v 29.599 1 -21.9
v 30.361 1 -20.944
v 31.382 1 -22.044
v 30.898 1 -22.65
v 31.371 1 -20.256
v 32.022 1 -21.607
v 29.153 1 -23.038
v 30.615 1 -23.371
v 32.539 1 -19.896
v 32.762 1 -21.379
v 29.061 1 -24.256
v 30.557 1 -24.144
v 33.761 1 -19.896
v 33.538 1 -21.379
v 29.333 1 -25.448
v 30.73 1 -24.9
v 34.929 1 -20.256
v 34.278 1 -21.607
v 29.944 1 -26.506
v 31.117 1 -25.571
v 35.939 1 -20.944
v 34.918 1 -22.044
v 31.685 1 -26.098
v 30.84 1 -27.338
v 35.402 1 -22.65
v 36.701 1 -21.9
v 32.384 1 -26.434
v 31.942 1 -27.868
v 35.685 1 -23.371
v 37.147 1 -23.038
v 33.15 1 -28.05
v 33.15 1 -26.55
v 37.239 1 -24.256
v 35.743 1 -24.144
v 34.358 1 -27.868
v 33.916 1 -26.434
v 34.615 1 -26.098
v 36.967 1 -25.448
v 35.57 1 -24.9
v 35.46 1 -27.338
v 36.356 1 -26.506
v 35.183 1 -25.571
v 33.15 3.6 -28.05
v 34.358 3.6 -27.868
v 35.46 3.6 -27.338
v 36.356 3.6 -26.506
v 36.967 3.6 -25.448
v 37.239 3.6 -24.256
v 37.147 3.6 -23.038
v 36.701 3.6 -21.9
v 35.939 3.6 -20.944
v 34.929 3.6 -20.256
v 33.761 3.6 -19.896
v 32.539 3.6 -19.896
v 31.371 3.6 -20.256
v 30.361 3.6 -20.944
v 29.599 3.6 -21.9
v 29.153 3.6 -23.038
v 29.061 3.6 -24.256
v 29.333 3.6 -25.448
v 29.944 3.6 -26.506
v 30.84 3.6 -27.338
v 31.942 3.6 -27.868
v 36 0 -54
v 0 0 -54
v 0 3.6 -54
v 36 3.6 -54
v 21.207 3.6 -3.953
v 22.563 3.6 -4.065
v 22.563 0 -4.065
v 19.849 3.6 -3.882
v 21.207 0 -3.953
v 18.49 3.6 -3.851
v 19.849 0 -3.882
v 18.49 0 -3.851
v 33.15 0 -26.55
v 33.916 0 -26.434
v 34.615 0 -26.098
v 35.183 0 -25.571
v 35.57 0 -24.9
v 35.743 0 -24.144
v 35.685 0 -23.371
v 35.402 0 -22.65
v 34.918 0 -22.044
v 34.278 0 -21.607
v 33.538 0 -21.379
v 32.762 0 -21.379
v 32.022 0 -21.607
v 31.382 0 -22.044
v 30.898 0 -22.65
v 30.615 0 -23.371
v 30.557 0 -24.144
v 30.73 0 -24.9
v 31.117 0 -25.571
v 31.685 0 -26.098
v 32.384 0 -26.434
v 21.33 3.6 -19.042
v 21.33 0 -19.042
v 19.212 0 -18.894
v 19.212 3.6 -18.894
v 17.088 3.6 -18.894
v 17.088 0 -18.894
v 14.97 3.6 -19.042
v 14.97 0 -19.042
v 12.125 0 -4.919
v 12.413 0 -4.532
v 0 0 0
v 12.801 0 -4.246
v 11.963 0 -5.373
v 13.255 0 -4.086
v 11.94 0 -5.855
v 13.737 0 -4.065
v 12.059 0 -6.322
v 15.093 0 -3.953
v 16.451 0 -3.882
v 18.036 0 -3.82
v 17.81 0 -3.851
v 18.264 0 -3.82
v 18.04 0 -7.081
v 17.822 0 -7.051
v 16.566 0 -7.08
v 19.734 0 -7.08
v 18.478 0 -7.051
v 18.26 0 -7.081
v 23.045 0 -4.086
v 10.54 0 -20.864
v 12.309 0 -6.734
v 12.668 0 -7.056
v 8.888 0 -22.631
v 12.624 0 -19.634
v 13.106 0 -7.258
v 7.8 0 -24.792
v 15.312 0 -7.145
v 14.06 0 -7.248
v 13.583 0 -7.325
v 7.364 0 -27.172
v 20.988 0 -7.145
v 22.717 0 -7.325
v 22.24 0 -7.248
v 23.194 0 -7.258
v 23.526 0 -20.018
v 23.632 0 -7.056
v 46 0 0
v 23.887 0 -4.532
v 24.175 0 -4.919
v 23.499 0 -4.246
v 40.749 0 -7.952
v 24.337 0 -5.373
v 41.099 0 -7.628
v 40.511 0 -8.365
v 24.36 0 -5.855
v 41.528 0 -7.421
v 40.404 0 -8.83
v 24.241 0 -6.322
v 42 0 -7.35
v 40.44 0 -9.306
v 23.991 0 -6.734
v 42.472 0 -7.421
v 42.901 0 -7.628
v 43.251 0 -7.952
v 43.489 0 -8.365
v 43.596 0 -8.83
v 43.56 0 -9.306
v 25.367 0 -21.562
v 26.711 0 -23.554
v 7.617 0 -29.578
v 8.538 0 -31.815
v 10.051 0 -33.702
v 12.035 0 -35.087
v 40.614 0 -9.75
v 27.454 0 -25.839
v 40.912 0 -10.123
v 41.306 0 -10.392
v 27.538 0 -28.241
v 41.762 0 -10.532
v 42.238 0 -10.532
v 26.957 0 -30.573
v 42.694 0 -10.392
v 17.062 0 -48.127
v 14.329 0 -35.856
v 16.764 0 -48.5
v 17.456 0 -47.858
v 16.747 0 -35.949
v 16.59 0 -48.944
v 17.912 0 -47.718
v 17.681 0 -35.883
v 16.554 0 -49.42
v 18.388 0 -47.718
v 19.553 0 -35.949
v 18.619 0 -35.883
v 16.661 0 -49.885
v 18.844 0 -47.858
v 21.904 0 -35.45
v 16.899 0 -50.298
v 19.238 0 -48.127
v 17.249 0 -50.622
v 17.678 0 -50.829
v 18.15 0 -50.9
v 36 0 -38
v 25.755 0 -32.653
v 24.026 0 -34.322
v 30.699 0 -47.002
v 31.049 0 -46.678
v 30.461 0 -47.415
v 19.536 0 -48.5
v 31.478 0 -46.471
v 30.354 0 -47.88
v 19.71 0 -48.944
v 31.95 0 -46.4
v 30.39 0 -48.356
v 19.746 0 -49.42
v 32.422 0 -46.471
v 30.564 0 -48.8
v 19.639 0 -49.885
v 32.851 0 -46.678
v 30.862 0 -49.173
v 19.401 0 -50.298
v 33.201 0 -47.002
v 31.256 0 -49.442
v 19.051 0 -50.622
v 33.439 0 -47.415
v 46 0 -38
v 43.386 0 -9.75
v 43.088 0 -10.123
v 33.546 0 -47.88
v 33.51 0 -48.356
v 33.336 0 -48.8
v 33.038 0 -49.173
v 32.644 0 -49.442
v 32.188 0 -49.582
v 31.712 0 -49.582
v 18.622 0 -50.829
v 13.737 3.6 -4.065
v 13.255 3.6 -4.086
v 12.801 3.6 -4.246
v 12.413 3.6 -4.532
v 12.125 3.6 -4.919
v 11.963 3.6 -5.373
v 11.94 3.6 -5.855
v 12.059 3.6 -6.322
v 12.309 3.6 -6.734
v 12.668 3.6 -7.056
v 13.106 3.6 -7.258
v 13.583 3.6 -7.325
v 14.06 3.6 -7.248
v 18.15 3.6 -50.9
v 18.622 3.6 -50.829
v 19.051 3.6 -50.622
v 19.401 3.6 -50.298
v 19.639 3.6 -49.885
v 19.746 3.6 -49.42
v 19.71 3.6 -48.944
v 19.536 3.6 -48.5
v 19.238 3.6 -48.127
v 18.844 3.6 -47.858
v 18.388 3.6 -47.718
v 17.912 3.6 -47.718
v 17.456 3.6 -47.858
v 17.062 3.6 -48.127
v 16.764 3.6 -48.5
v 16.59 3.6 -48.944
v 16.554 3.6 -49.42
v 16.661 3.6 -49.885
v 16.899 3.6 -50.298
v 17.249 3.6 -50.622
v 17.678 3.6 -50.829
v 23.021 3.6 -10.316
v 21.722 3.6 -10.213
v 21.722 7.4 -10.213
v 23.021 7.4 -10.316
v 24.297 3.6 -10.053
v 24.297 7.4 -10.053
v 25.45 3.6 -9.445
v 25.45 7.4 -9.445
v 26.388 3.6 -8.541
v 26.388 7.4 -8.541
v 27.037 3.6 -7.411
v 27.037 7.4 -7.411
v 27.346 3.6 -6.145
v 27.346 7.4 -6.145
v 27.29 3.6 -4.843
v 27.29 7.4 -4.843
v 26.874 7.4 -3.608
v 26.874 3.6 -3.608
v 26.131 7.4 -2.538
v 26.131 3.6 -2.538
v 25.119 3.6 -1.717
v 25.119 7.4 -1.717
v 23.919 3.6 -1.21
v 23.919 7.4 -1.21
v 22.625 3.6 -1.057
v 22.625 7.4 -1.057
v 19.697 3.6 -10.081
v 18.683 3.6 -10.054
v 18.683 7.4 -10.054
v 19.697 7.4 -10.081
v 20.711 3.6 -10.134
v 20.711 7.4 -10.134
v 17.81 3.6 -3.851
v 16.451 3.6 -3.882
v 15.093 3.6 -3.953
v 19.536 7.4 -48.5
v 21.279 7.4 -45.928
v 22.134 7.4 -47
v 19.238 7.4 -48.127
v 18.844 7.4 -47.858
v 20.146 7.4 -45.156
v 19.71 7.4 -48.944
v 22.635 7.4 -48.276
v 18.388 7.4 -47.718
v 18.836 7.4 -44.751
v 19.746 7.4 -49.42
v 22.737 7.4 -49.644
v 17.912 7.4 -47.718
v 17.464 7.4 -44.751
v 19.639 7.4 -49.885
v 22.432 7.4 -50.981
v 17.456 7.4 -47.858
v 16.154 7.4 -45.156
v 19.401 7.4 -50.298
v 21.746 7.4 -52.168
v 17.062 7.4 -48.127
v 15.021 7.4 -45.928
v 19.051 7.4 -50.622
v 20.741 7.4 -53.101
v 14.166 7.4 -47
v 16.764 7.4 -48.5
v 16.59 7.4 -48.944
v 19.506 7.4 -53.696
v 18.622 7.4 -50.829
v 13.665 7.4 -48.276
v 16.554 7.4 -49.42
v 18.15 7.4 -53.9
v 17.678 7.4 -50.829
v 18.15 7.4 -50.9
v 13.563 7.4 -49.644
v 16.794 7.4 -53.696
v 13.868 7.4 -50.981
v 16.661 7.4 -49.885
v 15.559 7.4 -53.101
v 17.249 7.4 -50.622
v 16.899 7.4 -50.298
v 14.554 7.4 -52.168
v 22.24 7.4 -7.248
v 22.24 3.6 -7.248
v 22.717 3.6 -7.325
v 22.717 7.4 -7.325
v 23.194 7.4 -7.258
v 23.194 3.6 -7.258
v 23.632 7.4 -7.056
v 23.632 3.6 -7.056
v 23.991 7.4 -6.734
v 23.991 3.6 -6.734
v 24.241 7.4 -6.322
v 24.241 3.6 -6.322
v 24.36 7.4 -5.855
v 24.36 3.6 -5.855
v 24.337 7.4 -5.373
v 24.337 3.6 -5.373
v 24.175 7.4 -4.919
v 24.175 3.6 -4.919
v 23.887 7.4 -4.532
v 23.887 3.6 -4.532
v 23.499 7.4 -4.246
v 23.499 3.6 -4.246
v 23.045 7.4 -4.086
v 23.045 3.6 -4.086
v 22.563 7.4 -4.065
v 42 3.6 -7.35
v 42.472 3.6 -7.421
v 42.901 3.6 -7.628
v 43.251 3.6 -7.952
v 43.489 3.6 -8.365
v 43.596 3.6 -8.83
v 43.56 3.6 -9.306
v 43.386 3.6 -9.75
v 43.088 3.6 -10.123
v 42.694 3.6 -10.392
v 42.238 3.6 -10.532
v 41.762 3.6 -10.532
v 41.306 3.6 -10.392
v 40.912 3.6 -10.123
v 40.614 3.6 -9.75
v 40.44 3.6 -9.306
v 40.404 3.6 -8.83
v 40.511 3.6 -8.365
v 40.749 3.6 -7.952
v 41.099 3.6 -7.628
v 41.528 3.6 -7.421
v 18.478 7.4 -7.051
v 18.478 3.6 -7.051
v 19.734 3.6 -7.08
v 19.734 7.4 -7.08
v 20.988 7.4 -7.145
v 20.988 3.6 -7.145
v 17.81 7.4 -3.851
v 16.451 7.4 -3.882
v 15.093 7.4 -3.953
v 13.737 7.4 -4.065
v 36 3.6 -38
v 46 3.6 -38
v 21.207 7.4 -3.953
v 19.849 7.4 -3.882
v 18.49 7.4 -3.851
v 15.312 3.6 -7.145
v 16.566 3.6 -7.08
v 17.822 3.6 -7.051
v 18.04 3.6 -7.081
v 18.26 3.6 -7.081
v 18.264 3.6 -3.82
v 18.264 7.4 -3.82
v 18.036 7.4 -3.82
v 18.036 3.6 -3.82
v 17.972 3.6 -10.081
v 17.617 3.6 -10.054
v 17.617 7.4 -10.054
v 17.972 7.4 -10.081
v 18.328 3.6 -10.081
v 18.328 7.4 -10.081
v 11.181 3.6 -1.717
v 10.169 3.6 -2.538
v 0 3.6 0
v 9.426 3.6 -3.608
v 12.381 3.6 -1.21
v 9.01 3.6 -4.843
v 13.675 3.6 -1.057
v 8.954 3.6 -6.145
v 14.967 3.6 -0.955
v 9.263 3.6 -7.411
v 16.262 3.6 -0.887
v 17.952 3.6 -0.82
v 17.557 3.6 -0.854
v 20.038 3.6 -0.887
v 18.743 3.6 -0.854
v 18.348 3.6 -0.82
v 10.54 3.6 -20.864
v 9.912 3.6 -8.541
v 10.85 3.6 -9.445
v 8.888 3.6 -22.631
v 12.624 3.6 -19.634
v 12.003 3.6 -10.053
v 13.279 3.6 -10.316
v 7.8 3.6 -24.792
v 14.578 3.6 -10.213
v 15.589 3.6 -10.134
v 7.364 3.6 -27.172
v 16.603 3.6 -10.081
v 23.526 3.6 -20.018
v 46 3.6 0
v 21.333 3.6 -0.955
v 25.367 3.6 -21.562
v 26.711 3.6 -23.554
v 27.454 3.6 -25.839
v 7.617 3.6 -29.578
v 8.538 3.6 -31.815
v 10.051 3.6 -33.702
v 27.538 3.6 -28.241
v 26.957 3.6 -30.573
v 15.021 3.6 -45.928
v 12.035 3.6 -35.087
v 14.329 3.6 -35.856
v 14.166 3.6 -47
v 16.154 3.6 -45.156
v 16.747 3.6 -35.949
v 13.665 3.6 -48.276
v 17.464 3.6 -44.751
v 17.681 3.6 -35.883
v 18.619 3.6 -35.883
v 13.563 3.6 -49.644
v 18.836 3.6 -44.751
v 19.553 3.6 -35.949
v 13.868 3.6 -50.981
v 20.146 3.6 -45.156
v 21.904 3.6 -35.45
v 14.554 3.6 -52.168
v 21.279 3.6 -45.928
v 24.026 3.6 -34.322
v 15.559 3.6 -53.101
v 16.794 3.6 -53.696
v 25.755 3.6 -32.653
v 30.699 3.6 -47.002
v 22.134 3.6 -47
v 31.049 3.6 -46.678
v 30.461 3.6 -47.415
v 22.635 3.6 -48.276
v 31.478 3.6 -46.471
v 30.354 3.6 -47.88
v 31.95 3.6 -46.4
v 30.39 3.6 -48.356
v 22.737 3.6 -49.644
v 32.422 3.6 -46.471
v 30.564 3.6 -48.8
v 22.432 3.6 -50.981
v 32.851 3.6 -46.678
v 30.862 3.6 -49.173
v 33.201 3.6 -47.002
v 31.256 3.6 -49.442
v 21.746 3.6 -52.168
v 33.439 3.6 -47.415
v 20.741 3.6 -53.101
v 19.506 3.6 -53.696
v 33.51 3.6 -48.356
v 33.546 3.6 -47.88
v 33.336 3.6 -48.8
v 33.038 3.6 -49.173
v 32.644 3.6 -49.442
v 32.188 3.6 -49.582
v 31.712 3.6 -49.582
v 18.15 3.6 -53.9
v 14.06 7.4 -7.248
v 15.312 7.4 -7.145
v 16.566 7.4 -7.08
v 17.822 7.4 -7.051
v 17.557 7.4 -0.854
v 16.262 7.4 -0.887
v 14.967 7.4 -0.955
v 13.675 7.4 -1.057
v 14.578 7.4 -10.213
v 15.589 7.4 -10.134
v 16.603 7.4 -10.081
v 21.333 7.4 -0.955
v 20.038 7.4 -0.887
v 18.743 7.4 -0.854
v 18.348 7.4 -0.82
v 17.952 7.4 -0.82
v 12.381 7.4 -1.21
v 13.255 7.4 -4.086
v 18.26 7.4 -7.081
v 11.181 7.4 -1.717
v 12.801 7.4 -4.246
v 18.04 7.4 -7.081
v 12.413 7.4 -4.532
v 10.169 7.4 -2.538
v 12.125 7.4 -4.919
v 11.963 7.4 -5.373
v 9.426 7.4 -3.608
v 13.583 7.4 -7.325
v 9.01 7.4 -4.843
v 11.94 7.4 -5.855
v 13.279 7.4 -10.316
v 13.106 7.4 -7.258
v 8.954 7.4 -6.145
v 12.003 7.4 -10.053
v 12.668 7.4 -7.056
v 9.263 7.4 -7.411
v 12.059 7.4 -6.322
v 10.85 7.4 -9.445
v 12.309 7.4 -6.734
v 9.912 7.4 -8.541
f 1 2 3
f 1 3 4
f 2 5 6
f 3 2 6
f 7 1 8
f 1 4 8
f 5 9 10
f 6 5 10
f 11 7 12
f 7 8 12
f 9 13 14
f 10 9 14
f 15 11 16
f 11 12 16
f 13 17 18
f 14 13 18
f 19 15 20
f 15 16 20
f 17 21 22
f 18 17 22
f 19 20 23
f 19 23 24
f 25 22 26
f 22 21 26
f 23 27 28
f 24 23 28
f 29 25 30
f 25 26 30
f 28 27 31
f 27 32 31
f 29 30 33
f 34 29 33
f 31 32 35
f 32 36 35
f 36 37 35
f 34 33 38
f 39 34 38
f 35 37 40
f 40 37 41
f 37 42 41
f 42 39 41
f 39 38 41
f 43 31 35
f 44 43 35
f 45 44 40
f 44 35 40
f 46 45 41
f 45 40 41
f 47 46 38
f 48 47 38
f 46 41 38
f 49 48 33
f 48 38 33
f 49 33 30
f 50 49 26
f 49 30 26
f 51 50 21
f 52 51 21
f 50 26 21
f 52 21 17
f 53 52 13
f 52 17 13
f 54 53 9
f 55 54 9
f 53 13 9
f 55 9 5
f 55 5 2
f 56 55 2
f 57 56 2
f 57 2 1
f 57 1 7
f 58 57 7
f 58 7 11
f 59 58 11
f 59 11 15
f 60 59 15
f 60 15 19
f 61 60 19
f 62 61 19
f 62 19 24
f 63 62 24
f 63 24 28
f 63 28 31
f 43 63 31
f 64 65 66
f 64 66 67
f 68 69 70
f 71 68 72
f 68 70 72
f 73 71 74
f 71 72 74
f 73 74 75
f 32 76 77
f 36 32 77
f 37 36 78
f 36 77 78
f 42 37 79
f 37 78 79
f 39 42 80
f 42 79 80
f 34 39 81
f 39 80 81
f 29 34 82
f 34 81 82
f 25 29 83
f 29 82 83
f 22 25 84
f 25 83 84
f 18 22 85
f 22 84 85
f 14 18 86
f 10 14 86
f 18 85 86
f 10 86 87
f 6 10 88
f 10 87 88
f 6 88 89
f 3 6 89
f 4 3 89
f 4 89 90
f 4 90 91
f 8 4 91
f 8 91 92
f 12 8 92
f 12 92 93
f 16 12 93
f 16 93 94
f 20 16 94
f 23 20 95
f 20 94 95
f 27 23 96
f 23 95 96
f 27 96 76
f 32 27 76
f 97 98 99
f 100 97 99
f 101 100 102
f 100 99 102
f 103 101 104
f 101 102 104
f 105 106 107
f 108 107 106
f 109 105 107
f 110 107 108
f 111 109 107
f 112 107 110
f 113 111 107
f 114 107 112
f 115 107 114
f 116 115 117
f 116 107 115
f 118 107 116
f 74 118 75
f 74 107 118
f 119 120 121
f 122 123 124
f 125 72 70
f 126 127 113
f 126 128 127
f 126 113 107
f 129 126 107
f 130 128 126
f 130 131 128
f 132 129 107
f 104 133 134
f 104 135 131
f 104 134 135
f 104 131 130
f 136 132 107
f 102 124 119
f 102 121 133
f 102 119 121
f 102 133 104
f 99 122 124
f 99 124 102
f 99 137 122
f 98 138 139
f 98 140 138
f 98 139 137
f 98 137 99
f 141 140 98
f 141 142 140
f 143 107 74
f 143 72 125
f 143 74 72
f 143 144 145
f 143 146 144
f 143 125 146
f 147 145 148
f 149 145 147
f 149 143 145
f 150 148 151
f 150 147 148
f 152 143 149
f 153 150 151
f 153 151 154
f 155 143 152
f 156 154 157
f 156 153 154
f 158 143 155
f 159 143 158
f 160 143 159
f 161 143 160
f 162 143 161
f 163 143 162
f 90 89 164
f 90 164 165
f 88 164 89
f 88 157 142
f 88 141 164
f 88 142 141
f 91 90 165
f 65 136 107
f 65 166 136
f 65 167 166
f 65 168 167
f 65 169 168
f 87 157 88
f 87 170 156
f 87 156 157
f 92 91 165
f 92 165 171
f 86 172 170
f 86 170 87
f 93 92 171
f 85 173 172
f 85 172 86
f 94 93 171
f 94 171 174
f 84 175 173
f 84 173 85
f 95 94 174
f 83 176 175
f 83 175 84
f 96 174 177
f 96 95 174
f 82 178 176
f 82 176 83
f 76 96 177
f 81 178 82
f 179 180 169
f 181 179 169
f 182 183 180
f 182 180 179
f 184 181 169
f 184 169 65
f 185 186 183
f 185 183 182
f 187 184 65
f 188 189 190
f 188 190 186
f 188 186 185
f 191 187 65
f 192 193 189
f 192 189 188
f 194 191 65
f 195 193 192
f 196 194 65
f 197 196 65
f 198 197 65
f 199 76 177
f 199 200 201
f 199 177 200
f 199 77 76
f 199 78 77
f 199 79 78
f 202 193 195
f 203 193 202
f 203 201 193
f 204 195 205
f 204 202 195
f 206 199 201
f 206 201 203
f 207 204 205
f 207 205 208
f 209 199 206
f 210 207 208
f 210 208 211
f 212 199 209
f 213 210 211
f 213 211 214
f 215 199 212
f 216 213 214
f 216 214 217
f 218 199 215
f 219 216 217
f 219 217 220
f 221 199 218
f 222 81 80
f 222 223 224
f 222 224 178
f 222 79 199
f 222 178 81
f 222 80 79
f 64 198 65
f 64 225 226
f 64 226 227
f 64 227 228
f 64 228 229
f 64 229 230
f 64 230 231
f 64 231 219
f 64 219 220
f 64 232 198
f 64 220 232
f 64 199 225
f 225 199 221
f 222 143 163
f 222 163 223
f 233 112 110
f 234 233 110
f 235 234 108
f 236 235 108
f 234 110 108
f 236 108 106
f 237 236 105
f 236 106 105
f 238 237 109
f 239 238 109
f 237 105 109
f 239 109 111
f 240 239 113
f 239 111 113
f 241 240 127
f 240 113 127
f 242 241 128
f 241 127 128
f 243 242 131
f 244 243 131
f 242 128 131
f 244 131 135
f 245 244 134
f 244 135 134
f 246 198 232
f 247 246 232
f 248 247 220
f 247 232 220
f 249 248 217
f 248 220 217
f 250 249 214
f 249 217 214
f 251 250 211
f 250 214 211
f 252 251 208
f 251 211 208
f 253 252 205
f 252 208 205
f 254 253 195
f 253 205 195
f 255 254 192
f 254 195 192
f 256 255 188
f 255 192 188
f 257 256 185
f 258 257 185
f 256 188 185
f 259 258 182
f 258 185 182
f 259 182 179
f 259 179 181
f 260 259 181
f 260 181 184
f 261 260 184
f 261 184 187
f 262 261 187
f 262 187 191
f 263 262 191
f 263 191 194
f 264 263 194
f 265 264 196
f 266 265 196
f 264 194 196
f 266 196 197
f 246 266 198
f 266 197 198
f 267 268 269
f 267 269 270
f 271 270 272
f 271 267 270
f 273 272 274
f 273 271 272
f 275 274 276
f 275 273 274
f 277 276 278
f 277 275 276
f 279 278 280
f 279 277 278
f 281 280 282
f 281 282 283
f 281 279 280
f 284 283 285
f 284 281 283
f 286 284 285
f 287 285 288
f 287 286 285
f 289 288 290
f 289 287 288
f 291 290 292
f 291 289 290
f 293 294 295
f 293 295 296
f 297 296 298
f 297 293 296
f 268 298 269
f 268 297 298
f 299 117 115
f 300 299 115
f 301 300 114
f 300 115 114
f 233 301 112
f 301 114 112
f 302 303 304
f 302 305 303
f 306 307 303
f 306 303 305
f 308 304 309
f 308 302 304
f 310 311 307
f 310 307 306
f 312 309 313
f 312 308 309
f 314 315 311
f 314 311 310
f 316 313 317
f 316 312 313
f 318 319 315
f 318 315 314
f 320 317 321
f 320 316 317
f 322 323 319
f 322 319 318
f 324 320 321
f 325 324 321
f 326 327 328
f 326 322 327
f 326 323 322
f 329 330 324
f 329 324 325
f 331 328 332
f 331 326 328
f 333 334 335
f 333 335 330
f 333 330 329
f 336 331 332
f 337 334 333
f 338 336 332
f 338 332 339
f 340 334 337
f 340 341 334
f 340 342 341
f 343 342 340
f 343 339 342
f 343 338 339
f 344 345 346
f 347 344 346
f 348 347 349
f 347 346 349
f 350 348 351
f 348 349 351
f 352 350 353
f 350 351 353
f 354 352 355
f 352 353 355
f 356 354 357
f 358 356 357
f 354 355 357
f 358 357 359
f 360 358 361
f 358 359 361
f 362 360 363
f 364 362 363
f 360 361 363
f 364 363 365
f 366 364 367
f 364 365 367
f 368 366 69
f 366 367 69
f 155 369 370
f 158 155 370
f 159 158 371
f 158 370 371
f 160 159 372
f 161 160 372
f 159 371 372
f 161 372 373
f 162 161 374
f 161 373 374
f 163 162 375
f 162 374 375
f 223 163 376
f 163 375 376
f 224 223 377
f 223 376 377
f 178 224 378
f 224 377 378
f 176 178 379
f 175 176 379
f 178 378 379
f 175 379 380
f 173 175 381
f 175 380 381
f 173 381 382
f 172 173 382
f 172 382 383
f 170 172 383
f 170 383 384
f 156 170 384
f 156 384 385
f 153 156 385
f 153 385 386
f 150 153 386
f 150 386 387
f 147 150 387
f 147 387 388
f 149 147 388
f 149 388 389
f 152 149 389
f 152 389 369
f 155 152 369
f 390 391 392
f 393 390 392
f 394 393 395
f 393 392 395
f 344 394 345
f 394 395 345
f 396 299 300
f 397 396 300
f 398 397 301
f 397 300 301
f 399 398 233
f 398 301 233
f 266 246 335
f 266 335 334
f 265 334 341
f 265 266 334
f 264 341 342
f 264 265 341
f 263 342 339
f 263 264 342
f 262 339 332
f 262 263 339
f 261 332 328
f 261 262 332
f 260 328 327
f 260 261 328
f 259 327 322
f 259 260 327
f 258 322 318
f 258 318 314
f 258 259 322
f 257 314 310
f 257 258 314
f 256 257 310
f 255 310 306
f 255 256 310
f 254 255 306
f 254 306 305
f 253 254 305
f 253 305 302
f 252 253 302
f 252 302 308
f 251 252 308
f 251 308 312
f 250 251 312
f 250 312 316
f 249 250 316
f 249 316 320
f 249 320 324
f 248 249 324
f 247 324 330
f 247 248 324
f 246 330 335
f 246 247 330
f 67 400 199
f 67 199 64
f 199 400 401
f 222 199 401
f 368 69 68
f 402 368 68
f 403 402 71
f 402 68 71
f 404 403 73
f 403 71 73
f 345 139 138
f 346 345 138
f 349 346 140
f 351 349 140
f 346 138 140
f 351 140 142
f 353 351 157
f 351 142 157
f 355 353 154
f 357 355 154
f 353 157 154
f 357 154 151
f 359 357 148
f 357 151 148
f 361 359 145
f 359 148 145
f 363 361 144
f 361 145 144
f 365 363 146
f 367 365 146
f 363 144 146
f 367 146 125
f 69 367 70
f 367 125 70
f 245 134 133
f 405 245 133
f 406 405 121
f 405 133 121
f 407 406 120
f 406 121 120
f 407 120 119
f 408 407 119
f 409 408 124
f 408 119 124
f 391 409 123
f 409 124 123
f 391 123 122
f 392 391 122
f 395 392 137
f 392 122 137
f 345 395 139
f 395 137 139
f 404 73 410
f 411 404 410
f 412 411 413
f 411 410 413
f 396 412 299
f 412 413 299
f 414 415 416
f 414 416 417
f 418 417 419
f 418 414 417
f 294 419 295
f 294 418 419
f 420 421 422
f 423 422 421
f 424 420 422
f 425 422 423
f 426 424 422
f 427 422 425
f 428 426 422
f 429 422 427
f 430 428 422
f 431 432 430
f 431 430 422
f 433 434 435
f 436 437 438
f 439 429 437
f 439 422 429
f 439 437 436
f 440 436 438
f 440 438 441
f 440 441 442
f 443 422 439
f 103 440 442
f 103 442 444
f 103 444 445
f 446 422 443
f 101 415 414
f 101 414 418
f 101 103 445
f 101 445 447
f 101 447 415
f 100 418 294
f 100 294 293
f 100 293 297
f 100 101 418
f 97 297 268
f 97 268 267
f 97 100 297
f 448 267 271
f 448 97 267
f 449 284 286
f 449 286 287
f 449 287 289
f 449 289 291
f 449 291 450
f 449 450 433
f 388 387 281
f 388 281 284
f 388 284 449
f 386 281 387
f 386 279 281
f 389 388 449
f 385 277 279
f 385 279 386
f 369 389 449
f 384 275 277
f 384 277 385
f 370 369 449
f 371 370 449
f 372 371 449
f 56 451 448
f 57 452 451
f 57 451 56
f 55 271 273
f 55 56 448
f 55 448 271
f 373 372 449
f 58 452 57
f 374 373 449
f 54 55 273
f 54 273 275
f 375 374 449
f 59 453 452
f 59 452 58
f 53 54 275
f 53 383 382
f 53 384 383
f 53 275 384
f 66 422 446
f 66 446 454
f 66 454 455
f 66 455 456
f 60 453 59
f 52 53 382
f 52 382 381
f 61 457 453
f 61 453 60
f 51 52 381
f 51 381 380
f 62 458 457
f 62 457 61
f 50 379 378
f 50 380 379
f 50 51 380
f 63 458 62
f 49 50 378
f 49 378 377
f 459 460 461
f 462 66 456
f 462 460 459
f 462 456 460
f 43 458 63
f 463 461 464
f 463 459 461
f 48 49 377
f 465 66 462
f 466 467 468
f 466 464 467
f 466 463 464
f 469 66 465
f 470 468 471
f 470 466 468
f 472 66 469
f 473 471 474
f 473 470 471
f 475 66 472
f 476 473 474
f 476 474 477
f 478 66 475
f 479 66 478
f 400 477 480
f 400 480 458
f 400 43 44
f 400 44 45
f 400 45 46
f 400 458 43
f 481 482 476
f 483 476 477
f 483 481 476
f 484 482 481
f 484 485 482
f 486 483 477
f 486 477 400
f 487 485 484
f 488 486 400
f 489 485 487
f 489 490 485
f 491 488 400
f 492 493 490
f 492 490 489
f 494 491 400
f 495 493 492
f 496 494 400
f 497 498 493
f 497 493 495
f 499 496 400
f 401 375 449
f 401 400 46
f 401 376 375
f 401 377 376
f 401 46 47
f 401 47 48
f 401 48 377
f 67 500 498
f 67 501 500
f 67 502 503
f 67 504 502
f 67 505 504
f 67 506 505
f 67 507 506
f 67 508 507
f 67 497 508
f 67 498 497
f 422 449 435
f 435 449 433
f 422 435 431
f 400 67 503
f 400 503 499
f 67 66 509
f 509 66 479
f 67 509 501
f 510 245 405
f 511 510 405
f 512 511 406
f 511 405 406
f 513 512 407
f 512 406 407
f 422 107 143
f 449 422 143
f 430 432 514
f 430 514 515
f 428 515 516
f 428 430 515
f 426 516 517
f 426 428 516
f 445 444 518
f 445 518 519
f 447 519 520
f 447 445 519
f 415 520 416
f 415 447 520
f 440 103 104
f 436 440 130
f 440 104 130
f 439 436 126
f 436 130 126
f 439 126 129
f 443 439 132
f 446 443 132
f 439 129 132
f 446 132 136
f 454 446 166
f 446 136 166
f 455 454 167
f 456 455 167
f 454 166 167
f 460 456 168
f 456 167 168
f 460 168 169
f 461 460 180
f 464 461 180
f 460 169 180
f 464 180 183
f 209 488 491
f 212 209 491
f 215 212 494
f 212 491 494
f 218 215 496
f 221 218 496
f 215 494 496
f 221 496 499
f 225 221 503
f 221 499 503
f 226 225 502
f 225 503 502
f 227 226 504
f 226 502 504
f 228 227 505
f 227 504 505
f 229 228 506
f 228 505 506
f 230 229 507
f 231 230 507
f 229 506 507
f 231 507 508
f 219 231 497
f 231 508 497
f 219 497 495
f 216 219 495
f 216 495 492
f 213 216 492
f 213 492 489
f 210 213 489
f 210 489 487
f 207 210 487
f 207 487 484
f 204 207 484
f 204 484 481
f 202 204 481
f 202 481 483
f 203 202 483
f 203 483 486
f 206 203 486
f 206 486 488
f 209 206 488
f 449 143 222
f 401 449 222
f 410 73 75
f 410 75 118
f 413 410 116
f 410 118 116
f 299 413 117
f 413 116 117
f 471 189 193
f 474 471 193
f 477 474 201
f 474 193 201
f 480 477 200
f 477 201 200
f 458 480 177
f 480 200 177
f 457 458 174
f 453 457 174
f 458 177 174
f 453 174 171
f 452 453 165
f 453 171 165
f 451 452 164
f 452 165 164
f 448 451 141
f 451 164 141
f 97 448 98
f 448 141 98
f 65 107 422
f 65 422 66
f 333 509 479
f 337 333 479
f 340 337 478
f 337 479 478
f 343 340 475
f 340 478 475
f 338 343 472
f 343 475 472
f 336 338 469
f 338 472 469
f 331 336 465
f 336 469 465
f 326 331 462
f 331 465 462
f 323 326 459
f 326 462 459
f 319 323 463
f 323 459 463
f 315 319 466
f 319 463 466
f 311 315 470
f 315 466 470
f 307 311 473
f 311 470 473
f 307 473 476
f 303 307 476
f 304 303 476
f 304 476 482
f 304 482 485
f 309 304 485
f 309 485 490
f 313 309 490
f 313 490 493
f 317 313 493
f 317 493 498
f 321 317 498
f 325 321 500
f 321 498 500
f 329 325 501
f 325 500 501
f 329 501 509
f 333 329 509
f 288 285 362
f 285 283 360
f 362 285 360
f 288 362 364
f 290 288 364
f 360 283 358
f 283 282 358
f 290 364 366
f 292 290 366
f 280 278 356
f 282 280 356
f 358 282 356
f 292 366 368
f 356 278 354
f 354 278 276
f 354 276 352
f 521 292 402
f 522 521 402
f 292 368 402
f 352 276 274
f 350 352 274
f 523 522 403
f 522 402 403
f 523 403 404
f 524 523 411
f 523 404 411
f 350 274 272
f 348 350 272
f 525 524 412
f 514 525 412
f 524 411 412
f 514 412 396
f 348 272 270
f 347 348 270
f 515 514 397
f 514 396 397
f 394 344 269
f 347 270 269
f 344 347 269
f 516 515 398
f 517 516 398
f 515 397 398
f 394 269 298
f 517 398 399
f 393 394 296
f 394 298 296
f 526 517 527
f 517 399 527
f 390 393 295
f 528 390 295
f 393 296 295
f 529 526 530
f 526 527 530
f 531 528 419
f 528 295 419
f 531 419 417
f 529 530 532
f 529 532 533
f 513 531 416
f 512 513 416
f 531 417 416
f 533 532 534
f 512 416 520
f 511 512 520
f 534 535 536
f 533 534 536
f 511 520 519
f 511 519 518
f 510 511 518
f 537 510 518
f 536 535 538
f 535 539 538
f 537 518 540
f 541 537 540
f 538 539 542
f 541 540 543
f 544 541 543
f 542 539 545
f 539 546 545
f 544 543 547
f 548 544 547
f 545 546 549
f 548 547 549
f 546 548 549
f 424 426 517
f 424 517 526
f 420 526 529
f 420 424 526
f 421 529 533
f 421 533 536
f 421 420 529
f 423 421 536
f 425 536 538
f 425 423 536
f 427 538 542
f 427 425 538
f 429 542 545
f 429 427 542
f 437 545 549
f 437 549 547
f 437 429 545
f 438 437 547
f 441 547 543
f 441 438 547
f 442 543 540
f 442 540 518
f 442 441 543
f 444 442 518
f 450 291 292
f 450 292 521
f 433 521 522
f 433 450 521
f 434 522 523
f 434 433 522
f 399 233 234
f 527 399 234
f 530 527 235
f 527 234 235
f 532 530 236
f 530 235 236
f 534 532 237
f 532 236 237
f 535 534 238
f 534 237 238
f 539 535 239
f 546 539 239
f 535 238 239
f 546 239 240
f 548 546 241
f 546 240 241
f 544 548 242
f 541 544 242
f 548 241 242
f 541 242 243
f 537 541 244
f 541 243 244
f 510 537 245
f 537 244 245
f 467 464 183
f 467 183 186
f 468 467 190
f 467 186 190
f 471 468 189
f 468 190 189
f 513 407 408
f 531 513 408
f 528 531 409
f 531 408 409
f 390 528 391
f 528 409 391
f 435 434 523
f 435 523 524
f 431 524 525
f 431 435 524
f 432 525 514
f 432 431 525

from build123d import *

# Parameters (mm, degrees)
SKETCH_1_W          = 46
SKETCH_1_H          = 54
EXTRUDE_1_DEPTH     = 3.6
SKETCH_2_R          = 1.6
SKETCH_2_R_2        = 1.634420344
SKETCH_2_R_3        = 8.5
SKETCH_2_R_4        = 4.1
CUT_EXTRUDE_1_DEPTH = 3.6
SKETCH_4_R          = 4.1
SKETCH_4_R_2        = 2.6
EXTRUDE_2_DEPTH     = 1
SKETCH_5_W          = 10
SKETCH_5_H          = 16
CUT_EXTRUDE_2_DEPTH = 4
CUT_EXTRUDE_3_DEPTH = 10
SKETCH_7_R          = 4.6
SKETCH_7_R_2        = 1.6
EXTRUDE_3_DEPTH     = 3.8
SKETCH_10_R         = 1.6
CUT_EXTRUDE_6_DEPTH = 72.038299529
SKETCH_11_R         = 1.6
CUT_EXTRUDE_7_DEPTH = 72.038299529


with BuildPart() as part:
    # 草图1 → 凸台-拉伸1 (new body)
    with BuildSketch(Plane(origin=(0, 0, 0), x_dir=(1, 0, 0), z_dir=(0, 1, 0))):
        with Locations((23, 27)):
            Rectangle(SKETCH_1_W, SKETCH_1_H)
    extrude(amount=EXTRUDE_1_DEPTH)

    # 草图2 → 切除-拉伸1 (cut)
    with BuildSketch(Plane(origin=(0, 0, 0), x_dir=(-1, 0, 0), z_dir=(0, -1, 0))):
        with Locations(Location((-18.15, 49.3, 0), (0, 0, 90))):
            Circle(SKETCH_2_R)
        with Locations(Location((-18.15, 5.45, 0), (0, 0, 90))):
            Circle(SKETCH_2_R_2)
        with Locations(Location((-18.15, 27.375, 0), (0, 0, 90))):
            Circle(SKETCH_2_R_3)
        with Locations(Location((-33.15, 23.95, 0), (0, 0, 90))):
            Circle(SKETCH_2_R_4)
    extrude(amount=-CUT_EXTRUDE_1_DEPTH, mode=Mode.SUBTRACT)

    # 草图4 → 凸台-拉伸2 (add)
    with BuildSketch(Plane(origin=(0, 0, 0), x_dir=(-1, 0, 0), z_dir=(0, -1, 0))):
        with Locations(Location((-33.15, 23.95, 0), (0, 0, 90))):
            Circle(SKETCH_4_R)
        with Locations(Location((-33.15, 23.95, 0), (0, 0, 90))):
            Circle(SKETCH_4_R_2, mode=Mode.SUBTRACT)
    extrude(amount=-EXTRUDE_2_DEPTH)

    # 草图5 → 切除-拉伸2 (cut)
    with BuildSketch(Plane(origin=(0, 3.6, 0), x_dir=(1, 0, 0), z_dir=(0, 1, 0))):
        with Locations((41, 46)):
            Rectangle(SKETCH_5_W, SKETCH_5_H)
    extrude(amount=-CUT_EXTRUDE_2_DEPTH, mode=Mode.SUBTRACT)

    # 草图6 → 切除-拉伸3 (cut)
    with BuildSketch(Plane(origin=(0, 0, 0), x_dir=(-1, 0, 0), z_dir=(0, -1, 0))):
        with BuildLine():
            ThreePointArc((-22.56285512, 4.064734889), (-18.15, 3.85), (-13.73714488, 4.064734889))
            ThreePointArc((-13.73714488, 4.064734889), (-11.94032174, 5.854871857), (-14.05952591, 7.248477772))
            ThreePointArc((-14.05952591, 7.248477772), (-18.15, 7.05), (-22.24047409, 7.248477772))
            ThreePointArc((-22.24047409, 7.248477772), (-24.35967826, 5.854871857), (-22.56285512, 4.064734889))
        make_face()
        with BuildLine():
            ThreePointArc((-21.330278495, 19.041671333), (-18.15, 18.875), (-14.969721505, 19.041671333))
            ThreePointArc((-14.969721505, 19.041671333), (-7.404777332, 28.383599382), (-16.746705381, 35.948543555))
            ThreePointArc((-16.746705381, 35.948543555), (-18.15, 35.875), (-19.553294619, 35.948543555))
            ThreePointArc((-19.553294619, 35.948543555), (-27.538099682, 28.240960008), (-21.330278495, 19.041671333))
        make_face()
    extrude(amount=-CUT_EXTRUDE_3_DEPTH, mode=Mode.SUBTRACT)

    # 草图7 → 凸台-拉伸3 (add)
    # profile 1 of 2: a face of its own
    with BuildSketch(Plane(origin=(0, 3.6, 0), x_dir=(1, 0, 0), z_dir=(0, 1, 0))):
        with Locations(Location((18.15, 49.3, 0), (0, 0, 90))):
            Circle(SKETCH_7_R)
        with Locations(Location((18.15, 49.3, 0), (0, 0, 90))):
            Circle(SKETCH_7_R_2, mode=Mode.SUBTRACT)
    # profile 2 of 2: a face of its own
    with BuildSketch(Plane(origin=(0, 3.6, 0), x_dir=(1, 0, 0), z_dir=(0, 1, 0))):
        with BuildLine():
            ThreePointArc((18.683380864, 10.053624309), (20.204186283, 10.103790761), (21.721904392, 10.21286658))
            ThreePointArc((21.721904392, 10.21286658), (27.345628596, 6.144963348), (22.624665084, 1.05707438))
            ThreePointArc((22.624665084, 1.05707438), (20.68567708, 0.916399041), (18.742606478, 0.853624309))
            ThreePointArc((18.742606478, 0.853624309), (18.15, 0.815579656), (17.557393522, 0.853624309))
            ThreePointArc((17.557393522, 0.853624309), (15.61432292, 0.916399041), (13.675334916, 1.05707438))
            ThreePointArc((13.675334916, 1.05707438), (8.954371404, 6.144963348), (14.578095608, 10.21286658))
            ThreePointArc((14.578095608, 10.21286658), (16.095813717, 10.103790761), (17.616619136, 10.053624309))
            ThreePointArc((17.616619136, 10.053624309), (18.15, 10.084420344), (18.683380864, 10.053624309))
        make_face()
        with BuildLine():
            ThreePointArc((18.477514951, 7.05126944), (20.361194151, 7.107902157), (22.24047409, 7.248477772))
            ThreePointArc((22.24047409, 7.248477772), (24.35967826, 5.854871857), (22.56285512, 4.064734889))
            ThreePointArc((22.56285512, 4.064734889), (20.528669211, 3.912287645), (18.489691709, 3.85126944))
            ThreePointArc((18.489691709, 3.85126944), (18.15, 3.815579656), (17.810308291, 3.85126944))
            ThreePointArc((17.810308291, 3.85126944), (15.771330789, 3.912287645), (13.73714488, 4.064734889))
            ThreePointArc((13.73714488, 4.064734889), (11.94032174, 5.854871857), (14.05952591, 7.248477772))
            ThreePointArc((14.05952591, 7.248477772), (15.938805849, 7.107902157), (17.822485049, 7.05126944))
            ThreePointArc((17.822485049, 7.05126944), (18.15, 7.084420344), (18.477514951, 7.05126944))
        make_face(mode=Mode.SUBTRACT)
    extrude(amount=EXTRUDE_3_DEPTH)

    # 草图10 → 切除-拉伸6 (cut, through all)
    with BuildSketch(Plane(origin=(0, 3.6, 0), x_dir=(1, 0, 0), z_dir=(0, 1, 0))):
        with Locations(Location((42, 8.95, 0), (0, 0, 270))):
            Circle(SKETCH_10_R)
    extrude(amount=-CUT_EXTRUDE_6_DEPTH, mode=Mode.SUBTRACT)

    # 草图11 → 切除-拉伸7 (cut, through all)
    with BuildSketch(Plane(origin=(0, 3.6, 0), x_dir=(1, 0, 0), z_dir=(0, 1, 0))):
        with Locations(Location((31.95, 48, 0), (0, 0, 270))):
            Circle(SKETCH_11_R)
    extrude(amount=-CUT_EXTRUDE_7_DEPTH, mode=Mode.SUBTRACT)


solid = part.part
